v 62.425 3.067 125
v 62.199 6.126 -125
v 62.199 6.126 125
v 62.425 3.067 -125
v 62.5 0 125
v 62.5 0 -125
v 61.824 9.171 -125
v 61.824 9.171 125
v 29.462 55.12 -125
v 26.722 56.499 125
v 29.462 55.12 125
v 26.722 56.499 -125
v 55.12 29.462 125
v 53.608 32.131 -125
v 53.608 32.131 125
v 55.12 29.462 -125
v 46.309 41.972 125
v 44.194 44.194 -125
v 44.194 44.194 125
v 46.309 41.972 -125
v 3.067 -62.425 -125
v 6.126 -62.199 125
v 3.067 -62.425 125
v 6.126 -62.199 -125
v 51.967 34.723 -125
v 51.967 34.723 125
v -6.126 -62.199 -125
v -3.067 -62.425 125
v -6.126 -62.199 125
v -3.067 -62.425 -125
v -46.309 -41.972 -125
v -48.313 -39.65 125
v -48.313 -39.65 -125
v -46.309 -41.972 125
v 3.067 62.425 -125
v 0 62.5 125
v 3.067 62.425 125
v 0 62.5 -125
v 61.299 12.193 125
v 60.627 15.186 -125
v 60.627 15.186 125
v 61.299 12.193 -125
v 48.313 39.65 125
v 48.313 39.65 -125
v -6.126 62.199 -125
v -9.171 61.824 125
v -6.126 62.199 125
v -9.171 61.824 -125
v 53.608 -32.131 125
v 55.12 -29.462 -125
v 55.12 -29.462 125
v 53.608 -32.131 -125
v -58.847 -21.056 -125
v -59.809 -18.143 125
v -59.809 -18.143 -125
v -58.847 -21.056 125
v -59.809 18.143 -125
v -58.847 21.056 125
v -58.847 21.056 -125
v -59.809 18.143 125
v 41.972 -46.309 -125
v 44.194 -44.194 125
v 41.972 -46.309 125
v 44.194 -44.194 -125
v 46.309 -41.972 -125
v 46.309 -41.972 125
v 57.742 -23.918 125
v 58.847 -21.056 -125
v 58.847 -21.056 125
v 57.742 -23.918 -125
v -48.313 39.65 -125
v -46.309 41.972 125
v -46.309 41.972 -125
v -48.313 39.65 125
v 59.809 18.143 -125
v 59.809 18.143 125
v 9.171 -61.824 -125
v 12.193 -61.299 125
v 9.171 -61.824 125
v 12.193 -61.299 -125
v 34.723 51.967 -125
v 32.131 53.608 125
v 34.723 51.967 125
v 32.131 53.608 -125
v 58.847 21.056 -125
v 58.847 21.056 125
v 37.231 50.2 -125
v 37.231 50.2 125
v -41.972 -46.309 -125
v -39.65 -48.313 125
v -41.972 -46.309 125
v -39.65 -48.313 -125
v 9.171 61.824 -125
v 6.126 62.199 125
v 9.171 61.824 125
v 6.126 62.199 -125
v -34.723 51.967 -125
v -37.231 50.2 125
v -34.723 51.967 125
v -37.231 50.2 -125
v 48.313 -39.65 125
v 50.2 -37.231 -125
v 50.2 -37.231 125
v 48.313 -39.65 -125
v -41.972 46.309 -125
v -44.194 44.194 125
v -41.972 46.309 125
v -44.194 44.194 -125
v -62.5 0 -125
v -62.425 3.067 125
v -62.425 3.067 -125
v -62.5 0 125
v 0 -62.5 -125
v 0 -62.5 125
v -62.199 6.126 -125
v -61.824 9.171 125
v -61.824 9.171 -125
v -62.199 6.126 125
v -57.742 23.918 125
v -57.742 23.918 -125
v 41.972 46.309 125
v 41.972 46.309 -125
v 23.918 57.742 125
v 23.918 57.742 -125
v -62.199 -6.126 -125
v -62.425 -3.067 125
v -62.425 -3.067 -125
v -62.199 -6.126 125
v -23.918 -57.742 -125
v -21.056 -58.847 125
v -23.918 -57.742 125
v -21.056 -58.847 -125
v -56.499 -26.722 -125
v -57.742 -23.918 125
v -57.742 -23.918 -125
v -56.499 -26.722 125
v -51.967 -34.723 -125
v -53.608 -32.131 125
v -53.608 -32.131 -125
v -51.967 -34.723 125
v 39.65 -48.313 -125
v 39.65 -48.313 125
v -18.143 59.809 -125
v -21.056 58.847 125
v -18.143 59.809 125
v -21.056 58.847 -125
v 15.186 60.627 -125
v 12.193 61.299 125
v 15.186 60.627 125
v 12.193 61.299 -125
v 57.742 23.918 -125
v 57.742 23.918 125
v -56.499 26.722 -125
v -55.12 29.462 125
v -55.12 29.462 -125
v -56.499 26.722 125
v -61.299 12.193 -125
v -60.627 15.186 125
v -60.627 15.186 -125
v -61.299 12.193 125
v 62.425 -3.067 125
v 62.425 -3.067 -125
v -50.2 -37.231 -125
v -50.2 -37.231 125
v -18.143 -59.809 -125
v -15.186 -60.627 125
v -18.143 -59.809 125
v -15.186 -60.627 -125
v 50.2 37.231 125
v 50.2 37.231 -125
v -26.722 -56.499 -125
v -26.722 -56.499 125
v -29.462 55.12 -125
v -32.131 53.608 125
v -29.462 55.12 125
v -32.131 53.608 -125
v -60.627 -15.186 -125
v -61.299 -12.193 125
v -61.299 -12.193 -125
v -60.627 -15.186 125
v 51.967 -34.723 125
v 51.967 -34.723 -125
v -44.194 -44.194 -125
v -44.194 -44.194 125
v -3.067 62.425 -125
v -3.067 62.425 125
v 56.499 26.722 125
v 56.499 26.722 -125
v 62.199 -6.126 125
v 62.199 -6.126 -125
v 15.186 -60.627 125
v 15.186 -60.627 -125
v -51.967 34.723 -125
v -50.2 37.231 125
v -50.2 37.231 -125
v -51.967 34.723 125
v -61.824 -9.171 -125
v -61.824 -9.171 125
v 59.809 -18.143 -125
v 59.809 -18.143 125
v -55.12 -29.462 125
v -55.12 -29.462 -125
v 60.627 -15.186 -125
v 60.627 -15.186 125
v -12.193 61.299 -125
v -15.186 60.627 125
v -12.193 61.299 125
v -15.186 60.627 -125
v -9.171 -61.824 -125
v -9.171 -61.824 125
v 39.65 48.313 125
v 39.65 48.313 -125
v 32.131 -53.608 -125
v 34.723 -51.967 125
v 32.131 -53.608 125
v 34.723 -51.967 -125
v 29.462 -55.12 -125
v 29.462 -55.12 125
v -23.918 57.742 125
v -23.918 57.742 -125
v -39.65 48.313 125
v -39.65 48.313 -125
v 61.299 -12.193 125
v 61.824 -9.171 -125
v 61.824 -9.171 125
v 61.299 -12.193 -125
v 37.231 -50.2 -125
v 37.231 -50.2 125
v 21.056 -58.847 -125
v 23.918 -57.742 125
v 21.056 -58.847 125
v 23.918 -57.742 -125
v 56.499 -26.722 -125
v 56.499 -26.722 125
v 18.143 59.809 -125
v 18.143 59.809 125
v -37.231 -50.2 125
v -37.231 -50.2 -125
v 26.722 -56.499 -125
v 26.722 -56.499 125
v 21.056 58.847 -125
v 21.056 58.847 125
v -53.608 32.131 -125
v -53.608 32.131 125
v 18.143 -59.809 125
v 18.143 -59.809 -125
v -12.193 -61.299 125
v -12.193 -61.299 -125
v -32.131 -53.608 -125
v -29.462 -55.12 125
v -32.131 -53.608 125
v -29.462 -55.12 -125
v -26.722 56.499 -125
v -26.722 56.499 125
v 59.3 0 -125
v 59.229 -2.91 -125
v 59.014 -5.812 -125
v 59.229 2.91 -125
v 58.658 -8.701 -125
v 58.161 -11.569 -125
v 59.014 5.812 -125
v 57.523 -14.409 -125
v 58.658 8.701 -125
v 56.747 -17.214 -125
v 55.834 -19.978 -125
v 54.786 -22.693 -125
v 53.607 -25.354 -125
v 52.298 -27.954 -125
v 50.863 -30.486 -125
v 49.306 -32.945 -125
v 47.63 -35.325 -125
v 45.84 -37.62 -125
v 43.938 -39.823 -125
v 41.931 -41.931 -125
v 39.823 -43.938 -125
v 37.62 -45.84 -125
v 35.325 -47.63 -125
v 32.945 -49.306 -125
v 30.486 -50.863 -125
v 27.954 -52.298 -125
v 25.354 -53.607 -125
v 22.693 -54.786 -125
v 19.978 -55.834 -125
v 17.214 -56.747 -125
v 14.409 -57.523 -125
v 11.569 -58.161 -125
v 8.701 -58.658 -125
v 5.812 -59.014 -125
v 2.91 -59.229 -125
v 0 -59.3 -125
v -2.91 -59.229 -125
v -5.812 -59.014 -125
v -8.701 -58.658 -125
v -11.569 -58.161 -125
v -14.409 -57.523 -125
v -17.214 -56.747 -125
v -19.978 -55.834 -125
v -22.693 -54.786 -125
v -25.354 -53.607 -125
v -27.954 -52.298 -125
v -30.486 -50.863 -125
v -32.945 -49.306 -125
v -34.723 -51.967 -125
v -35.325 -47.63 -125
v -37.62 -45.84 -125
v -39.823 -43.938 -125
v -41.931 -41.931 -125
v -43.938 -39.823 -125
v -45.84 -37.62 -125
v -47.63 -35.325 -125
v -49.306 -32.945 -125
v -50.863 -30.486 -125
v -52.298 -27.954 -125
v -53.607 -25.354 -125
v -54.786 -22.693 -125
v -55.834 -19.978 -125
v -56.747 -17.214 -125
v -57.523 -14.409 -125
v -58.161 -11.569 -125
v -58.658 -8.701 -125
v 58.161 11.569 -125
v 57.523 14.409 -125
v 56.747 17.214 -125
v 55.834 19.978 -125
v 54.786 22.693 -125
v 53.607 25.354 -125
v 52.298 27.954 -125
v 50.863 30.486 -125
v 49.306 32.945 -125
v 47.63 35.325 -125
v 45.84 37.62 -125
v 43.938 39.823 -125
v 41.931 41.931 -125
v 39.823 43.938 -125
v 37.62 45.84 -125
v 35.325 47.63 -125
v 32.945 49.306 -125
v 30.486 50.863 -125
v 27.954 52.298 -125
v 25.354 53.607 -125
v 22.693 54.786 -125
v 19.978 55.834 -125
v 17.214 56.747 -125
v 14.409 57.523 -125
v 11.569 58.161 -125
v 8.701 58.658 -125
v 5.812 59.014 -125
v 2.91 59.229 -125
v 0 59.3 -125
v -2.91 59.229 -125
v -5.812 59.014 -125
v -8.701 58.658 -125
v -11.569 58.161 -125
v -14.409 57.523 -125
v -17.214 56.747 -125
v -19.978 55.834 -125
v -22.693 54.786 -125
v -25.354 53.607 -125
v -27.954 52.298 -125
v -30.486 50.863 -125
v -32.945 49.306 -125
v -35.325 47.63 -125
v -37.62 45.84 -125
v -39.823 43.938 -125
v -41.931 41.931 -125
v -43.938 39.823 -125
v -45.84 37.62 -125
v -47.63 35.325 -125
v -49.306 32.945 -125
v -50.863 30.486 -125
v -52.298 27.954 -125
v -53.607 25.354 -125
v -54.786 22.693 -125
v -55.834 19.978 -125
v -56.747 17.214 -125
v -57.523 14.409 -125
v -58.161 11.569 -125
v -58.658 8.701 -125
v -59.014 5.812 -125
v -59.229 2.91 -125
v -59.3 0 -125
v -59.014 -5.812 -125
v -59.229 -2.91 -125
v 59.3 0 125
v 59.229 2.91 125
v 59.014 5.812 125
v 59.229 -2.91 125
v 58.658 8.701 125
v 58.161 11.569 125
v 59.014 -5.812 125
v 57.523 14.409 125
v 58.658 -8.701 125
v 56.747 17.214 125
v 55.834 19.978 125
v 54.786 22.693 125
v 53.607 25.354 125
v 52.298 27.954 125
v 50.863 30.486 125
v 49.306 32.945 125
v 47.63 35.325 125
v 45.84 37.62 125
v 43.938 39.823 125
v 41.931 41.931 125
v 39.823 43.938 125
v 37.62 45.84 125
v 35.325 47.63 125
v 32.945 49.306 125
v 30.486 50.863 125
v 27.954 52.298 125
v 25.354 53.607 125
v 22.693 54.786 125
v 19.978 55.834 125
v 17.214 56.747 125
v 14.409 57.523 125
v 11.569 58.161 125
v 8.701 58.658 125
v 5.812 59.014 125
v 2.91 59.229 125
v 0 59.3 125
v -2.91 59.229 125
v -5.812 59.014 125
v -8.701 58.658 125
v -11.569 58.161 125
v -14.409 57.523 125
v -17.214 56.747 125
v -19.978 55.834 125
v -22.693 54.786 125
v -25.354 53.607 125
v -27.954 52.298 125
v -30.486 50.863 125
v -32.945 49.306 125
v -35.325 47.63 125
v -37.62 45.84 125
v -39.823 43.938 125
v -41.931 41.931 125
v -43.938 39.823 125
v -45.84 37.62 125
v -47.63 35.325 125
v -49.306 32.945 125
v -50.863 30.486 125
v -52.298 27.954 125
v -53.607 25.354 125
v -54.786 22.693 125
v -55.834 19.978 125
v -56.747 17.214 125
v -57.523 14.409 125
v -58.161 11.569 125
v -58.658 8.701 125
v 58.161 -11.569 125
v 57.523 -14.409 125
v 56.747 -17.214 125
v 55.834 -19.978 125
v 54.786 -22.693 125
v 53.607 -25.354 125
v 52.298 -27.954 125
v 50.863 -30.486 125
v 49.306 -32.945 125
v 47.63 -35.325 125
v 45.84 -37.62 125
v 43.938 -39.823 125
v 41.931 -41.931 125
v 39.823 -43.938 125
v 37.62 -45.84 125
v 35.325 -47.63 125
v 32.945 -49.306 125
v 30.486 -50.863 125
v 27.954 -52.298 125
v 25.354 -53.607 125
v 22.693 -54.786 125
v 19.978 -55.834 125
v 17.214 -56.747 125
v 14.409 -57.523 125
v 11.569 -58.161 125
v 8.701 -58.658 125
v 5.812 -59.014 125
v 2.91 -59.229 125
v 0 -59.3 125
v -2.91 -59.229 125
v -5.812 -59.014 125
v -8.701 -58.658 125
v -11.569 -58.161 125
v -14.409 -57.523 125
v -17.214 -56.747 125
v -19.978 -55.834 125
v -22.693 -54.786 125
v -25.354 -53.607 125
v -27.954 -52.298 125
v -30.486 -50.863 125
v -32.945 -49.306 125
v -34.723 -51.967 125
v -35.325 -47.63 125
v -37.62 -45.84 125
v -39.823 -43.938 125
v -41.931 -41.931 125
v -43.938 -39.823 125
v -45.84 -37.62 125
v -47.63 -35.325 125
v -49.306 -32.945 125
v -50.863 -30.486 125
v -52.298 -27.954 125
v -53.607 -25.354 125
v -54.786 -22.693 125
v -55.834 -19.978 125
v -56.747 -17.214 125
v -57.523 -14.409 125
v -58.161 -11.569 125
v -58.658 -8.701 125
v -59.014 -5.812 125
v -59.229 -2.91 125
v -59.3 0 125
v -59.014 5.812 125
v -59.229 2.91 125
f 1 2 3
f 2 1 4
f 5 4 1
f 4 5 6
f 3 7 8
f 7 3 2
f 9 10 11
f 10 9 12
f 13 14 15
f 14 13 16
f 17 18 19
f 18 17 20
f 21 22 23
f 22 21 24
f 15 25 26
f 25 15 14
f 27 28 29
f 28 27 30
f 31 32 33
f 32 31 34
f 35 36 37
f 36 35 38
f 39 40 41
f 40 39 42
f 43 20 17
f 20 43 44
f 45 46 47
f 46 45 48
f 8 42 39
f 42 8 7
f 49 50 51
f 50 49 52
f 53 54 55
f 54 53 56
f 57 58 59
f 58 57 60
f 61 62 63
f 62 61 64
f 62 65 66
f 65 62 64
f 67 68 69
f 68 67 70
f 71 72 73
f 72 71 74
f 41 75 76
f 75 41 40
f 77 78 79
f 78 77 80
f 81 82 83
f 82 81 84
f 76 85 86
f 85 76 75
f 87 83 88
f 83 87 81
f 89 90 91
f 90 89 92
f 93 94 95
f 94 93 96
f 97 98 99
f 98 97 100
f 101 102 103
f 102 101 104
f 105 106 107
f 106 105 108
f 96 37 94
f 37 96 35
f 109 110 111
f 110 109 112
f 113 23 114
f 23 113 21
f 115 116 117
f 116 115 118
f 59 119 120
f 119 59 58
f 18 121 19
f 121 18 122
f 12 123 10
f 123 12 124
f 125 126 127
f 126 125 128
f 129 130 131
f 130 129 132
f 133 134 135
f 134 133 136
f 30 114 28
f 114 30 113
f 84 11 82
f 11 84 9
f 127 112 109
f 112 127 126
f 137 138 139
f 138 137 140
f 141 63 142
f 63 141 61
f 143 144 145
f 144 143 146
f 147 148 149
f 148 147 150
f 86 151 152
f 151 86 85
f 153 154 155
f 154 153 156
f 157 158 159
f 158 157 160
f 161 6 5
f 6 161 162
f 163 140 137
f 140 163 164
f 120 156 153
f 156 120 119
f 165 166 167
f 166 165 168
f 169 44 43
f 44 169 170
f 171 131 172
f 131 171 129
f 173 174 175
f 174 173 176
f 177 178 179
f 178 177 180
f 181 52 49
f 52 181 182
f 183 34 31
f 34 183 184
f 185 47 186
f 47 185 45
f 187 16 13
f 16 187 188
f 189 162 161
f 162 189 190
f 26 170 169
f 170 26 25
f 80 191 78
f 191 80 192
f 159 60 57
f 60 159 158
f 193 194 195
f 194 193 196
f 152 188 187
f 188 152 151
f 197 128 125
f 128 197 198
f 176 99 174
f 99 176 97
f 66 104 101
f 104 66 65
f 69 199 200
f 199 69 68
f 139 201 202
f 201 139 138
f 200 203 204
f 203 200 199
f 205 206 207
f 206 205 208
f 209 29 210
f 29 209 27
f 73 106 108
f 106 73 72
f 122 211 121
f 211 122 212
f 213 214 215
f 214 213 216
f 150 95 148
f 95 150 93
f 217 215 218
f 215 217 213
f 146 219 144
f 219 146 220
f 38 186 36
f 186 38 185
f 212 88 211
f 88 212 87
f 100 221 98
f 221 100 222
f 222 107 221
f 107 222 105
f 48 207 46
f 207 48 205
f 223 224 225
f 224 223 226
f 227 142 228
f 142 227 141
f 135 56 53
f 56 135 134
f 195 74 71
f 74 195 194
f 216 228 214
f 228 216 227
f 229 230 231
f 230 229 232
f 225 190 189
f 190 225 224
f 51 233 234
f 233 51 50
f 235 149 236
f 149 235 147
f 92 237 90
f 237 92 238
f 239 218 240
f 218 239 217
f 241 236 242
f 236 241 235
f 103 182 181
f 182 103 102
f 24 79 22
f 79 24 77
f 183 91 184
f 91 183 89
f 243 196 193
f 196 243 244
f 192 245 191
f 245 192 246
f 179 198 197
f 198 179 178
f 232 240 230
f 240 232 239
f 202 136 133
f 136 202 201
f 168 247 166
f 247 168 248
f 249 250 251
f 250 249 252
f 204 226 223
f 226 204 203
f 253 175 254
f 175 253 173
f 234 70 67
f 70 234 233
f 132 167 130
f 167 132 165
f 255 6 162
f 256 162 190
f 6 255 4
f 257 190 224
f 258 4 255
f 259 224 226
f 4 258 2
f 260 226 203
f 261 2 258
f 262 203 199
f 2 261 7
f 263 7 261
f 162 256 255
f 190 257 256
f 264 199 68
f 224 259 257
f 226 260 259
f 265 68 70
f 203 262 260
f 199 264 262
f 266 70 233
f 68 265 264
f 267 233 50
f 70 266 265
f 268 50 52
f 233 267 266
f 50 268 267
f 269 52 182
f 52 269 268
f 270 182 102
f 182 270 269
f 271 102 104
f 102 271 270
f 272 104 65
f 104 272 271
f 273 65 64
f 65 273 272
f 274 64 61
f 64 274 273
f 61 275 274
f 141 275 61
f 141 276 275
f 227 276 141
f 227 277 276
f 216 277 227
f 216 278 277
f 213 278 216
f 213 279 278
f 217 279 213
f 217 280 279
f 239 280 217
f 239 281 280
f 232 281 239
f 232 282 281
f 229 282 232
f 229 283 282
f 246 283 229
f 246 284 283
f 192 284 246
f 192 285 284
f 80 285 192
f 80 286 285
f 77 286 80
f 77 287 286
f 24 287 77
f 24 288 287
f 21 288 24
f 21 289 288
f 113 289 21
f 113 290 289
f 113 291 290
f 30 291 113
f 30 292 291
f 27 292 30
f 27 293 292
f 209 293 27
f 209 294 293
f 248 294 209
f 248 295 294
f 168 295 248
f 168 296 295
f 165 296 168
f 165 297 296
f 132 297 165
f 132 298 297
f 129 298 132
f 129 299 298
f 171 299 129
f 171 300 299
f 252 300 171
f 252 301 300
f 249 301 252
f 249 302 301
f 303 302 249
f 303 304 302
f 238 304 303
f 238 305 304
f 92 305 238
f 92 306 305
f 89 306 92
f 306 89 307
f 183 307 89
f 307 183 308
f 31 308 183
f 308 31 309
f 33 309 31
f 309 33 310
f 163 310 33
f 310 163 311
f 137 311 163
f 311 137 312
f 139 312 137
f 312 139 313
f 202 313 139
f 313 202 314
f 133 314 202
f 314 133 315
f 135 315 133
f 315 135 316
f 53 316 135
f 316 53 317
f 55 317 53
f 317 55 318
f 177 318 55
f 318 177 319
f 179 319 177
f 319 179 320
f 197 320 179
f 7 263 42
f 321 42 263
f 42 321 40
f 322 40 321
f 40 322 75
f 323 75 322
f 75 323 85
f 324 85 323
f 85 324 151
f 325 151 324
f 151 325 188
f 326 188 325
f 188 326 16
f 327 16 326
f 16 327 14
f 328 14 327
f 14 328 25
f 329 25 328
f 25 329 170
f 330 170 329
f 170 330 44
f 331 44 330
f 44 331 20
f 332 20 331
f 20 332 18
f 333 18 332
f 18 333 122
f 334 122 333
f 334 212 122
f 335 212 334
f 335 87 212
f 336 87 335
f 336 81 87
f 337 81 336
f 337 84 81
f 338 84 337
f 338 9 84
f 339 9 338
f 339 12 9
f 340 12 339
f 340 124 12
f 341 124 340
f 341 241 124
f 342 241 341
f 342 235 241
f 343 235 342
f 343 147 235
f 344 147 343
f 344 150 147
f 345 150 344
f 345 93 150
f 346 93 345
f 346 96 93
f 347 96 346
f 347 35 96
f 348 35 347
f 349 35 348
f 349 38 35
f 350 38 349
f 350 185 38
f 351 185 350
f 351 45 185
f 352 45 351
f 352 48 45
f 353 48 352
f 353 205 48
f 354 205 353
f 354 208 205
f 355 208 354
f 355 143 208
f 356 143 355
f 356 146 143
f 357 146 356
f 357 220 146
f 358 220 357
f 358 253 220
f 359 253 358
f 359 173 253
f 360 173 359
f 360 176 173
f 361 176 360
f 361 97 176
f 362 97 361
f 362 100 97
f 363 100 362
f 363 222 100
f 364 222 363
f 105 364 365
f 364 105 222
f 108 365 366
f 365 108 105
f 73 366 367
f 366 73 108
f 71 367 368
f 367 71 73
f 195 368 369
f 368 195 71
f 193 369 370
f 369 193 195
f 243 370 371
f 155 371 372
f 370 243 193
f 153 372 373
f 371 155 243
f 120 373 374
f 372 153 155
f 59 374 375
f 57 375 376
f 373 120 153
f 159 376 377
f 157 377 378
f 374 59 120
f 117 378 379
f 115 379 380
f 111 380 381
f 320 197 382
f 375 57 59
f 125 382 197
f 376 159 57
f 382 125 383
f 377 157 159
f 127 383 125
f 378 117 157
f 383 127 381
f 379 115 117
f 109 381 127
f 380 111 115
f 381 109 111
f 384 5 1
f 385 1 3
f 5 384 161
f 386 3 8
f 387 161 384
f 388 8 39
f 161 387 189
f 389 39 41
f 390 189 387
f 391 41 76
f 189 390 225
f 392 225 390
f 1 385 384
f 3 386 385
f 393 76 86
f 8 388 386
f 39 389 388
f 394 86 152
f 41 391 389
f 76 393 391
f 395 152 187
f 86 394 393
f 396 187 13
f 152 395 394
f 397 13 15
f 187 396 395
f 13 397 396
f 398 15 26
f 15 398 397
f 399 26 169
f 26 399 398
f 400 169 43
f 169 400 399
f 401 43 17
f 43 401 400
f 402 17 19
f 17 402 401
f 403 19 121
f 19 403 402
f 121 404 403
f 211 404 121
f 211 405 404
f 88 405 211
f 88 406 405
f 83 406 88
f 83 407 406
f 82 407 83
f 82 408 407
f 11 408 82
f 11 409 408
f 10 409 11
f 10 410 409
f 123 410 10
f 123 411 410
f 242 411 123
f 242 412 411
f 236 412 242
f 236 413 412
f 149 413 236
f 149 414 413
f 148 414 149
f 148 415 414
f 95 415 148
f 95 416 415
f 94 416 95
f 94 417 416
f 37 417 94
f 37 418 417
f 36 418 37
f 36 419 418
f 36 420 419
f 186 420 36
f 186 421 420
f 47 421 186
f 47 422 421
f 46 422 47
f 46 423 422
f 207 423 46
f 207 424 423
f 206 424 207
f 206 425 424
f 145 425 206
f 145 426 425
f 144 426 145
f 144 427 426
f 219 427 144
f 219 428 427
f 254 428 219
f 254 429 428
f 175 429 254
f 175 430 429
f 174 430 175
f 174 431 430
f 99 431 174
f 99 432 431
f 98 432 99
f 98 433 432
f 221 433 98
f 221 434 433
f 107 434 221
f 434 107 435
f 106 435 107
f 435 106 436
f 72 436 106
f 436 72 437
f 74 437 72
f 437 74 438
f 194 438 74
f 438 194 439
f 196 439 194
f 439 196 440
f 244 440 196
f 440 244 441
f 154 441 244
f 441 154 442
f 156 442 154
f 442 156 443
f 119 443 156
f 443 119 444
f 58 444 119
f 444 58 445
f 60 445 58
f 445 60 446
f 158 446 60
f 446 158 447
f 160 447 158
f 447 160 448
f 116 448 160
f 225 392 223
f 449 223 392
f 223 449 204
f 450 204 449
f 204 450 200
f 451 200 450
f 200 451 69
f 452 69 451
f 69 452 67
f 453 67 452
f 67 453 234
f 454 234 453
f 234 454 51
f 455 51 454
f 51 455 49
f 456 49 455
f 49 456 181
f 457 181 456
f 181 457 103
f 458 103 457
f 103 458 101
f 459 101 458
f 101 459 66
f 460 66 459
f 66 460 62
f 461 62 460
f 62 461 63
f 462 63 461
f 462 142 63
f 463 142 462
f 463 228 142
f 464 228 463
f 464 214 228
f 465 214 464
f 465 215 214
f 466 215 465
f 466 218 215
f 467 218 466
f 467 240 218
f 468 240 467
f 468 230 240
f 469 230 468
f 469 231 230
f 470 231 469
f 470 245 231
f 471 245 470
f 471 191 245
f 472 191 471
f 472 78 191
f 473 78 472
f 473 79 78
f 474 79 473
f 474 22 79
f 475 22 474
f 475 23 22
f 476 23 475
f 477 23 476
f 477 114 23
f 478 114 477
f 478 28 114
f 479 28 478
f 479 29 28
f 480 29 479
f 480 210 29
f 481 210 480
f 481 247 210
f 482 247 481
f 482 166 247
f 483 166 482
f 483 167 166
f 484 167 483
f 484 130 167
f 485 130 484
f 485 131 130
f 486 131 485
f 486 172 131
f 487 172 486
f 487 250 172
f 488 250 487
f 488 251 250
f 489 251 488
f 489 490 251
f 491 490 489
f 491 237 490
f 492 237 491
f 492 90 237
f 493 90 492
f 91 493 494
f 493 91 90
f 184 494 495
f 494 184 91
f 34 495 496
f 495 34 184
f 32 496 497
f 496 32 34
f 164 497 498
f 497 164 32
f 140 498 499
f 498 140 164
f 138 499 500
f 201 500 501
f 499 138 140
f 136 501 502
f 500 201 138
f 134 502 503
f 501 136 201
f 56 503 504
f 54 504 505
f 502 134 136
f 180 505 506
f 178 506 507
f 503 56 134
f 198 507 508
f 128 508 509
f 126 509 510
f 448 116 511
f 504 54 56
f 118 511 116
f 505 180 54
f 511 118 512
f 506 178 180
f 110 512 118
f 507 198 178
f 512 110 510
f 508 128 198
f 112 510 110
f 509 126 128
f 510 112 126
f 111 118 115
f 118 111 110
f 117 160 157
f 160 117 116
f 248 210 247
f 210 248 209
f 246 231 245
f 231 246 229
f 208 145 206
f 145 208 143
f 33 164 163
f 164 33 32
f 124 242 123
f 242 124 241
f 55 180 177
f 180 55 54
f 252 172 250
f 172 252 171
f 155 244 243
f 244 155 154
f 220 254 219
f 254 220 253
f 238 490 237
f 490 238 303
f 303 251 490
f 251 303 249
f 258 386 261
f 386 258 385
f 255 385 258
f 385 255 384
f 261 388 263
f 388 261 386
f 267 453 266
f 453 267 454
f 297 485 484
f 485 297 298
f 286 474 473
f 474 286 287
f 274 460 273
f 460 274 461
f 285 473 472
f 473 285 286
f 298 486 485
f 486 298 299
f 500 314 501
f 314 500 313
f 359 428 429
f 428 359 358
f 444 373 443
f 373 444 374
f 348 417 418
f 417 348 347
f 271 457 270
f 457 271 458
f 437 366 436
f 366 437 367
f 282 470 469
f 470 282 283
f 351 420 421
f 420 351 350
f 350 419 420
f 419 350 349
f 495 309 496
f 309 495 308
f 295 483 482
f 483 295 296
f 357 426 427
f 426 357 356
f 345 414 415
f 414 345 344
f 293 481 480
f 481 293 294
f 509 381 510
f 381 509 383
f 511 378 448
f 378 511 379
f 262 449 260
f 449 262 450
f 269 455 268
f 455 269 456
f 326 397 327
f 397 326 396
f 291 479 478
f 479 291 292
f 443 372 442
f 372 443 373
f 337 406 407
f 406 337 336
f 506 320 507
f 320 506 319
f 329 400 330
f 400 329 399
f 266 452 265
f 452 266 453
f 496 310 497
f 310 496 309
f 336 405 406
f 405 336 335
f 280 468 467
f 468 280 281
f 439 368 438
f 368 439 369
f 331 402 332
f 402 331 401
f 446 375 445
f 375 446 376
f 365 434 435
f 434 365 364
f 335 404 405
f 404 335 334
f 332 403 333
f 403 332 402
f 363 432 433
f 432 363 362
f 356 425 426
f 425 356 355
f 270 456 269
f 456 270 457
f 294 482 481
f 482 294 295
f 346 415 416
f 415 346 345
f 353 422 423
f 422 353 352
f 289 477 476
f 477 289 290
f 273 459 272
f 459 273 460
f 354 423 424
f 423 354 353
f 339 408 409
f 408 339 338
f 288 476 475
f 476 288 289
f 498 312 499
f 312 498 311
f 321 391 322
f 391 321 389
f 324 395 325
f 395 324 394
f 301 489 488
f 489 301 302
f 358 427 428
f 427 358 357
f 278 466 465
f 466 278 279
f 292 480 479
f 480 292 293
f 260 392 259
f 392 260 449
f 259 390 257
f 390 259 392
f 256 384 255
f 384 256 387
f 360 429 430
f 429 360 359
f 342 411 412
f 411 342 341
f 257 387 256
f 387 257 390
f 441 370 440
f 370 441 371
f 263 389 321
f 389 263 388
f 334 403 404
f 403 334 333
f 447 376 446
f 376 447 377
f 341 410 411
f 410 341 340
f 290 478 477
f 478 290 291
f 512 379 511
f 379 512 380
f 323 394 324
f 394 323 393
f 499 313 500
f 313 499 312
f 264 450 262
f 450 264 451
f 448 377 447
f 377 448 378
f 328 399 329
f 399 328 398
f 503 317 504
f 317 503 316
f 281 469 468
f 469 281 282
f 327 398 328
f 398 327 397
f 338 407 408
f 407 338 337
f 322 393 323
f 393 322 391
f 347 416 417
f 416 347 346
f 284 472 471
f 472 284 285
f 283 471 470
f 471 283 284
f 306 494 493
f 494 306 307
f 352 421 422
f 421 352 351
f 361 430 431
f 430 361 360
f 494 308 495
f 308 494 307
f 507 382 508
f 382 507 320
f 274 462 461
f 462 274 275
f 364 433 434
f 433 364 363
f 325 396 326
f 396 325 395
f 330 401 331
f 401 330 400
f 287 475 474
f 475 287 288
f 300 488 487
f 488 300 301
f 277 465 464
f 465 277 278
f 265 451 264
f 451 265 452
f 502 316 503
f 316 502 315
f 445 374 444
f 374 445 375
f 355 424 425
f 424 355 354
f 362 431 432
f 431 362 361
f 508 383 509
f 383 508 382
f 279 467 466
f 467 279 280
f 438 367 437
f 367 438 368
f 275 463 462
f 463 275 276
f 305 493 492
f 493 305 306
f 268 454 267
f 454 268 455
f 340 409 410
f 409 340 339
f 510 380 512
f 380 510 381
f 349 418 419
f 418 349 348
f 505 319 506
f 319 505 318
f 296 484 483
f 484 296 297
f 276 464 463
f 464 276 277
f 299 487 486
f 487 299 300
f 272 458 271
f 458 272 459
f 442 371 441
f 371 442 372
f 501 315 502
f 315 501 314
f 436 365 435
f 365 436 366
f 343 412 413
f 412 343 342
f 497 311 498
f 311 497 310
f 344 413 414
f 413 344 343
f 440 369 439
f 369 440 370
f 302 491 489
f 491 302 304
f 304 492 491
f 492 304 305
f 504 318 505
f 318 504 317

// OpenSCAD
$fn=128;

module ht_pipe(od=125, length=250, wall=3.2) {
    difference() {
        cylinder(h=length, d=od, center=true);
        cylinder(h=length+2, d=od-2*wall, center=true);
    }
}

ht_pipe(od=125, length=250, wall=3.2);
